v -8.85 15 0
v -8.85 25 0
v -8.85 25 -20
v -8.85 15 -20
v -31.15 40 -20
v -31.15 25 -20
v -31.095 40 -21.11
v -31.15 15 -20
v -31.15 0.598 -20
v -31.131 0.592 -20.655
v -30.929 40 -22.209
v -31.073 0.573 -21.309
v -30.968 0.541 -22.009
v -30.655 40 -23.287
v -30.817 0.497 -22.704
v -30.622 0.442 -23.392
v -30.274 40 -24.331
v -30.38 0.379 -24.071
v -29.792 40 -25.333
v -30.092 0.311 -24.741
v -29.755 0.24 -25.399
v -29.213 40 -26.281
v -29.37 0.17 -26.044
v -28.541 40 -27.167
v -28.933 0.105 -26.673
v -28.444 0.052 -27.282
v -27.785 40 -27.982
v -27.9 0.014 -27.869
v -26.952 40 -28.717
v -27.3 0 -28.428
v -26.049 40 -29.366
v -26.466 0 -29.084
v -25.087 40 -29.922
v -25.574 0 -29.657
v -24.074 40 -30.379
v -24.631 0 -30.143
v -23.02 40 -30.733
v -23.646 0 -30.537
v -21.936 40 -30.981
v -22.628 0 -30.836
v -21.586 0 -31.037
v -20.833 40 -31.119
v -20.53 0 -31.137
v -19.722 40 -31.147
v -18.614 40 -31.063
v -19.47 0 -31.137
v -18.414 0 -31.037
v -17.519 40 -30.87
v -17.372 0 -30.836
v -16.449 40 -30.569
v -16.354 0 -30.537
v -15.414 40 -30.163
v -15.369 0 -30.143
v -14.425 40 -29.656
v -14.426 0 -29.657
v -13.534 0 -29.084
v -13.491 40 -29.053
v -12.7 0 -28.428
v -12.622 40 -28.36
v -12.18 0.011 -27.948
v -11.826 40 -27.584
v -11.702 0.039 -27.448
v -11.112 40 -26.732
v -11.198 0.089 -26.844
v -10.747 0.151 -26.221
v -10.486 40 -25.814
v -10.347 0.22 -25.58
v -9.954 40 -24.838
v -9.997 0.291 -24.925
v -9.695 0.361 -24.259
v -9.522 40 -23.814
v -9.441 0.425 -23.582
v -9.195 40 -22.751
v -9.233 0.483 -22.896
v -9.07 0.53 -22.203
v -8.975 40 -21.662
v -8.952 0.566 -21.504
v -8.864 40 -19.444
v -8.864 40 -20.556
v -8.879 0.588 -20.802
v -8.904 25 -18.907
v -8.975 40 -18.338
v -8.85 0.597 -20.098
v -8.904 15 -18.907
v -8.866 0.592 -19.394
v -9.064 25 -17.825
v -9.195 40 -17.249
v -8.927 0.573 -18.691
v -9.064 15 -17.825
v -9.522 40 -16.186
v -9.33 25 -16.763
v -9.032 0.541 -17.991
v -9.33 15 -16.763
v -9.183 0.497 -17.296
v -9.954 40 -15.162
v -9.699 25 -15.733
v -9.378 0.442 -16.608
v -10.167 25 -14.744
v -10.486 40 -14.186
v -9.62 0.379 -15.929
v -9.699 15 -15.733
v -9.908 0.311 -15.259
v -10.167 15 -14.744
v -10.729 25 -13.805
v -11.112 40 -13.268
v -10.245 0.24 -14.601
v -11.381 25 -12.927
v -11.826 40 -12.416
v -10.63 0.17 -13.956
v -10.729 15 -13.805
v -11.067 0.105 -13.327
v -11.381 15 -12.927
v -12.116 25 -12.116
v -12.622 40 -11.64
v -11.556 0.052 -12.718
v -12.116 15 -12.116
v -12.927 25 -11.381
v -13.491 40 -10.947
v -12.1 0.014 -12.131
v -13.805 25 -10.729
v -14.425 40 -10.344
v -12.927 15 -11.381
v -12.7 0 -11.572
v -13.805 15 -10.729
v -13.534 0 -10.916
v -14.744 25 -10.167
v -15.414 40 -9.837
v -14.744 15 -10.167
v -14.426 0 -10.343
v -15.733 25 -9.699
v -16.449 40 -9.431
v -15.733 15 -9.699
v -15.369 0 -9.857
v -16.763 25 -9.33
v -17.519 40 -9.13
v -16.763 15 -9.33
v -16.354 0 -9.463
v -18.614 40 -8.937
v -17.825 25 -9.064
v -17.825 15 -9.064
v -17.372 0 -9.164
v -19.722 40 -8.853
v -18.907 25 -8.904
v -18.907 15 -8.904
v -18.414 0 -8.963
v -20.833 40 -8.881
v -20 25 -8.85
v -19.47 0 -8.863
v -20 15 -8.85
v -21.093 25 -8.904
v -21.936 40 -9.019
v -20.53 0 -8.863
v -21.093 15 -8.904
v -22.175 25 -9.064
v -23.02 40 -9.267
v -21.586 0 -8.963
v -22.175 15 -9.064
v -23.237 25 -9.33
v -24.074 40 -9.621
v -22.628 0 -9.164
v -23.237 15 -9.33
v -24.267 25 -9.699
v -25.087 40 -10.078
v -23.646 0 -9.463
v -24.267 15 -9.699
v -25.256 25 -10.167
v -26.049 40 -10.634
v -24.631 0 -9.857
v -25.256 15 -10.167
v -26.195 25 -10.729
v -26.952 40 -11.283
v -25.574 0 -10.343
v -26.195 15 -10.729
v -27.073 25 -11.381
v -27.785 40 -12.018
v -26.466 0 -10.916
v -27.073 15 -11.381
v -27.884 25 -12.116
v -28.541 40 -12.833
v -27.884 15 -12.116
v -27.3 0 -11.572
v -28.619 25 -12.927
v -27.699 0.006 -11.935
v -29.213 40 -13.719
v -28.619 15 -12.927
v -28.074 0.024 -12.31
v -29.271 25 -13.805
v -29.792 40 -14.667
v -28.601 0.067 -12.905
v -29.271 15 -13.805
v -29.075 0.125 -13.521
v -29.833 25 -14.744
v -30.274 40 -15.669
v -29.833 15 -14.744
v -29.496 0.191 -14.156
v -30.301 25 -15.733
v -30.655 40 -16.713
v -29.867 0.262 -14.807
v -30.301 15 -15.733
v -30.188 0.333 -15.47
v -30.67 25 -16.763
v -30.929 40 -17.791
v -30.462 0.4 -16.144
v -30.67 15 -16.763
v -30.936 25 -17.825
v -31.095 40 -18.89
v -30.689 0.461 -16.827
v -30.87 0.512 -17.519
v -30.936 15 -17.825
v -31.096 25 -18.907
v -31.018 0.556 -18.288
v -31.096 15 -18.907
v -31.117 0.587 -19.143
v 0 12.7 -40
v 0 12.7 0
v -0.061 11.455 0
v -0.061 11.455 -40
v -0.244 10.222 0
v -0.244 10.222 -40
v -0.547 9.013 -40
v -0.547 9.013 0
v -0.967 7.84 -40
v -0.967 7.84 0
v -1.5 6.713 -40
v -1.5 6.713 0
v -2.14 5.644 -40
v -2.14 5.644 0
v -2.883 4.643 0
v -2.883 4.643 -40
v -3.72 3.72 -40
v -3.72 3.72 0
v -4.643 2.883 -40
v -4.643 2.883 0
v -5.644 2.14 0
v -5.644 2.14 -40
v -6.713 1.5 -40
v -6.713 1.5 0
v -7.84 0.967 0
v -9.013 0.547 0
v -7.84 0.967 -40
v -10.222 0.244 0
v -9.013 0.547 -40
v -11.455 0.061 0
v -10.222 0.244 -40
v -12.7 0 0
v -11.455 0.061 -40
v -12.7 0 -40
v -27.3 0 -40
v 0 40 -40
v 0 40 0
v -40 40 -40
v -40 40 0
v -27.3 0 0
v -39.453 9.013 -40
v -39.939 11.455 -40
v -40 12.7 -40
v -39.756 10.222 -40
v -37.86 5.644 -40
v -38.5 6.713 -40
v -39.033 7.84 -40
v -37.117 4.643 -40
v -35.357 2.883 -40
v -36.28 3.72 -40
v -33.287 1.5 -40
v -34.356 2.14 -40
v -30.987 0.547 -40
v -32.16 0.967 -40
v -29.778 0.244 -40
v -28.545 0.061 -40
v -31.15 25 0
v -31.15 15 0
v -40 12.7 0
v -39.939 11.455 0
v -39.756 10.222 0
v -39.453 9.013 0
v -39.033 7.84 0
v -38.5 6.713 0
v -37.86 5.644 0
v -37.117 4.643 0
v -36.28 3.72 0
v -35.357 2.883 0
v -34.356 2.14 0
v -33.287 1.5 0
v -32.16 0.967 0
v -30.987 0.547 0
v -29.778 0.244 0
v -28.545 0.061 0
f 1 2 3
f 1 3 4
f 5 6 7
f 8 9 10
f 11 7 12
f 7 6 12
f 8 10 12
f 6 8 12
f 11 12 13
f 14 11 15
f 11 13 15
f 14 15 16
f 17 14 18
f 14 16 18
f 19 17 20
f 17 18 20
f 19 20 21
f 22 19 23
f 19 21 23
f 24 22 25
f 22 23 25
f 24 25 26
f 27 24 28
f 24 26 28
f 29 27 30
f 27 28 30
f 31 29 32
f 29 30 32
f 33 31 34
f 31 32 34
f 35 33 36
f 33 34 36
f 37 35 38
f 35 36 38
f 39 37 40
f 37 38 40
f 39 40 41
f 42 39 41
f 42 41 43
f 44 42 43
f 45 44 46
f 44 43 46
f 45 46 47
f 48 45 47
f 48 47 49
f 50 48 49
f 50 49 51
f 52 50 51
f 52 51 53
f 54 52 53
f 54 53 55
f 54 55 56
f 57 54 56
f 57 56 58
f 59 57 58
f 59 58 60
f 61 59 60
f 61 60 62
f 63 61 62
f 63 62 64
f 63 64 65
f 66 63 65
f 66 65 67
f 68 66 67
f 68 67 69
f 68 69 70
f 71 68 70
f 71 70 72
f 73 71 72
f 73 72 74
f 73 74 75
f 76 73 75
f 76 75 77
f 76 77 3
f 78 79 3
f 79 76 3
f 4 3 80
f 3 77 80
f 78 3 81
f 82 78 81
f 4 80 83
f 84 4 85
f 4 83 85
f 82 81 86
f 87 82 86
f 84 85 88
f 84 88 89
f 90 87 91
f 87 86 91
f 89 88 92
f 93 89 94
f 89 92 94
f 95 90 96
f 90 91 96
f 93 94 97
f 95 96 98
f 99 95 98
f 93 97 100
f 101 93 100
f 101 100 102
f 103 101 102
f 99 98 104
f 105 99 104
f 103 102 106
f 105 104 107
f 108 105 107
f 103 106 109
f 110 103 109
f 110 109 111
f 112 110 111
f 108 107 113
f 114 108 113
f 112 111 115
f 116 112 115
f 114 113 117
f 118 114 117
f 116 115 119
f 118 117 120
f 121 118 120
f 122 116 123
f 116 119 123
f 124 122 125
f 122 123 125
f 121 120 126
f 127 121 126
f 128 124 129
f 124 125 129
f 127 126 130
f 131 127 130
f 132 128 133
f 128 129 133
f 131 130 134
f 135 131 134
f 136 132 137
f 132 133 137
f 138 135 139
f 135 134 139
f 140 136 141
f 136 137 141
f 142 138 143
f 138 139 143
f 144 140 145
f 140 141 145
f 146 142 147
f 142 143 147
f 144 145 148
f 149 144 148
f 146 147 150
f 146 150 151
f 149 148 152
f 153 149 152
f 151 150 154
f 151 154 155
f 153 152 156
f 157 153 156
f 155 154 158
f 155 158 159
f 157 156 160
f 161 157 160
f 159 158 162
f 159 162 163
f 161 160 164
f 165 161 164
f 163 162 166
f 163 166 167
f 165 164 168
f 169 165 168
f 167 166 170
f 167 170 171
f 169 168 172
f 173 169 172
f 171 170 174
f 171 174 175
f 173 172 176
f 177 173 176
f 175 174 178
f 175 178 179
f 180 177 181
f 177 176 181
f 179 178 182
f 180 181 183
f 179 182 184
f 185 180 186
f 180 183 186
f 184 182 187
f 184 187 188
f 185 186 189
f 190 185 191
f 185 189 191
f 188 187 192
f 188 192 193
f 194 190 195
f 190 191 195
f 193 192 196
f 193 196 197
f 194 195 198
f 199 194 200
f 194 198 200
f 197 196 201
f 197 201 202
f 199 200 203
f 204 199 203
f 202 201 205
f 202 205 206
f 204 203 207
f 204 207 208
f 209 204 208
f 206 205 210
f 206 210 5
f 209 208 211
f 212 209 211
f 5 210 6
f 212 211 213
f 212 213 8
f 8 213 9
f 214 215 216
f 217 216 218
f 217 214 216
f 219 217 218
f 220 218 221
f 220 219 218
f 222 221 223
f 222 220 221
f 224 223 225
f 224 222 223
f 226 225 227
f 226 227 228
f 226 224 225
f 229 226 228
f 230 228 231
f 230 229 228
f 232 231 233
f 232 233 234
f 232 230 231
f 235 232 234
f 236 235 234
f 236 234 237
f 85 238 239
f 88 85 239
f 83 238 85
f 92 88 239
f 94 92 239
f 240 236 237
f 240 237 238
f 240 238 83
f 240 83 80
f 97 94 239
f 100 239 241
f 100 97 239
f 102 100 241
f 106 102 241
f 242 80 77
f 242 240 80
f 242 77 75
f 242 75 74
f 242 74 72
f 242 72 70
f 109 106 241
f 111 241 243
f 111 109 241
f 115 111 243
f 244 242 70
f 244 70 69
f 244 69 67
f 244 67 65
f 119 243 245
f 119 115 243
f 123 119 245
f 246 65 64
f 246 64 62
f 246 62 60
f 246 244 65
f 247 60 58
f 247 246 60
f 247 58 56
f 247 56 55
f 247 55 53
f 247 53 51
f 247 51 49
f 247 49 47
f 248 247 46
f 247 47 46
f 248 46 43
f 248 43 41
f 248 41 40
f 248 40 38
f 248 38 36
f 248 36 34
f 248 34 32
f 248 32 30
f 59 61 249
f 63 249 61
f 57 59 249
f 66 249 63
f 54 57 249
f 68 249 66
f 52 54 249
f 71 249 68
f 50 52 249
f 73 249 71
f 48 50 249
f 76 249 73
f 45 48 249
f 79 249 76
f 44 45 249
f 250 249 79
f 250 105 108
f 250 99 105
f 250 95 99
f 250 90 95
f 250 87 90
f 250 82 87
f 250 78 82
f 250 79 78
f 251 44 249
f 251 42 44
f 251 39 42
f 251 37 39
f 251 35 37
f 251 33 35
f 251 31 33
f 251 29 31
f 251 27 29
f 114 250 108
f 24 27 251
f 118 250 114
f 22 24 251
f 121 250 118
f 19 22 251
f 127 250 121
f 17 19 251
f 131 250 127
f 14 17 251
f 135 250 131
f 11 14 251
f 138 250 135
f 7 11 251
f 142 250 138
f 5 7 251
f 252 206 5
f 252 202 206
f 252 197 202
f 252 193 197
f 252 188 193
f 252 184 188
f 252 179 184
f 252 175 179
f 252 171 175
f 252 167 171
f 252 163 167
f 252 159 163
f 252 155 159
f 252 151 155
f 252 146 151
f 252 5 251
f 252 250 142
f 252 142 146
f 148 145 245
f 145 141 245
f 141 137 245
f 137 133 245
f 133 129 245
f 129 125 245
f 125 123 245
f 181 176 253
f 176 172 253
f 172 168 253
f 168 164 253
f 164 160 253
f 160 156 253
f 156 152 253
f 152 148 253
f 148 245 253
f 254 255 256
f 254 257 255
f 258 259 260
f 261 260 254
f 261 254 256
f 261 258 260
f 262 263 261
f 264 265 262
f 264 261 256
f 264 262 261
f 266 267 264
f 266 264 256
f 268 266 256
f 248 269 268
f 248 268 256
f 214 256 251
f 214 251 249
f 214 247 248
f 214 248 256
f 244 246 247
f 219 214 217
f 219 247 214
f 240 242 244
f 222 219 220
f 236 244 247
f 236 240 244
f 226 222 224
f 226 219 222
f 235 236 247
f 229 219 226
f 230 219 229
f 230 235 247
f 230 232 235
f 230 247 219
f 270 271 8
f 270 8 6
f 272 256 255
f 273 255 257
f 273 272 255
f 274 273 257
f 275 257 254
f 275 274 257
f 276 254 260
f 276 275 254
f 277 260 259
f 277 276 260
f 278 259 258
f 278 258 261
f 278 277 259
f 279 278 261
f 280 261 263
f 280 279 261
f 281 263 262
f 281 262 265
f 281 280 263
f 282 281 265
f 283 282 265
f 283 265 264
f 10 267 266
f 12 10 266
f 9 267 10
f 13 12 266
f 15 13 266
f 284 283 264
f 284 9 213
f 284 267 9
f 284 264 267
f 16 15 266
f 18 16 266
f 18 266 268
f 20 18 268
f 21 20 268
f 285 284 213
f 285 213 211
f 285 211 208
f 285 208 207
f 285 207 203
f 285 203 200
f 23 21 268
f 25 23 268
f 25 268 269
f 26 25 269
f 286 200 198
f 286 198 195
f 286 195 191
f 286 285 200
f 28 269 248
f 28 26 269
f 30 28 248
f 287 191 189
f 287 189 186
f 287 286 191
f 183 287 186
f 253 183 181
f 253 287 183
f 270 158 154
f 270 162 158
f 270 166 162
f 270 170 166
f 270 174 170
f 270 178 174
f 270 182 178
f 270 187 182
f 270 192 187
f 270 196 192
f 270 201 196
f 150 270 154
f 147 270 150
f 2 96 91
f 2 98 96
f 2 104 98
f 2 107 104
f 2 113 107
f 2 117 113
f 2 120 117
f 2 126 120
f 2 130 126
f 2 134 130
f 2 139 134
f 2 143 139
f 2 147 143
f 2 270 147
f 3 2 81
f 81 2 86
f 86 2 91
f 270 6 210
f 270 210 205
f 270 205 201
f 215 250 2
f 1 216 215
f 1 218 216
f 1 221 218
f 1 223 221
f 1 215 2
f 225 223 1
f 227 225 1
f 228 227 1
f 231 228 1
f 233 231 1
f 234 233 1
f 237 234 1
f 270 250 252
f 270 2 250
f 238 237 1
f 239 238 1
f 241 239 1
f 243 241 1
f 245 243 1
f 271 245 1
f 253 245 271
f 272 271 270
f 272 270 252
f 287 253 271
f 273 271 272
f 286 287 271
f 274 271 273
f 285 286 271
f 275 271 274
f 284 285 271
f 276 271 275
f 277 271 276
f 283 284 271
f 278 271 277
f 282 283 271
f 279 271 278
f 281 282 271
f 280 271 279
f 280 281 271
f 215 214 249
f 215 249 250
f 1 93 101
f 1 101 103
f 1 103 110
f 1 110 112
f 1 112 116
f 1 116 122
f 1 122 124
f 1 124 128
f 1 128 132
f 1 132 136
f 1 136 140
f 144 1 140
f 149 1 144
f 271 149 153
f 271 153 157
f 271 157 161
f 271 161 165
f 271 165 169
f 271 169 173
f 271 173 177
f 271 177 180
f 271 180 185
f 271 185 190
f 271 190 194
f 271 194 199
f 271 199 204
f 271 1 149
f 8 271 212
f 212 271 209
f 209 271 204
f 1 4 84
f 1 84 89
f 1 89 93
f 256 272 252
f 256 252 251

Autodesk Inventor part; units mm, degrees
ref_plane "YZ Plane" through (0, 0, 0) normal (1, 0, 0) x (0, 1, 0)
ref_plane "XZ Plane" through (0, 0, 0) normal (0, 1, 0) x (-1, 0, 0)
ref_plane "XY Plane" through (0, 0, 0) normal (0, 0, 1) x (1, 0, 0)
sketch "Sketch1" plane through (0, 0, 0) normal (0, 1, 0) x (-1, 0, 0)
  line L0 (0, 0) -> (40, 0)
  line L1 (40, 0) -> (40, -40)
  line L2 (40, -40) -> (0, -40)
  line L3 (0, -40) -> (0, 0)
  circle A0 centre (20, -20) radius 11.15
  dimension "d0" = 40
  dimension "d1" = 40
  dimension "d2" = 22.3
  dimension "d3" = 20
  dimension "d4" = 20
extrude "Extrusion1" add sketch "Sketch1" along normal blind 40
fillet "Fillet1" radius 12.7 2 edges at (0, 0, -20) (-40, 0, -20)
sketch "Sketch2" plane through (-40, 40, 0) normal (0, 0, 1) x (1, 0, 0)
  line L0 (8.85, -15) -> (31.15, -15)
  line L1 (31.15, -15) -> (31.15, -25)
  line L2 (31.15, -25) -> (8.85, -25)
  line L3 (8.85, -25) -> (8.85, -15)
  line L4 (8.85, -15) -> (31.15, -25) construction
  line L5 (31.15, -15) -> (8.85, -25) construction
  line L6 (40, -27.3) -> (40, 0) projected
  line L7 (27.3, -40) -> (12.7, -40) projected
  point P0 (40, -40)
  point P1 (20, -20)
  dimension "d8" = 20
  dimension "d9" = 22.3
  dimension "d10" = 10
  dimension "d11" = 15
extrude "Extrusion2" cut sketch "Sketch2" against normal blind 20
properties part number "YMountB"
